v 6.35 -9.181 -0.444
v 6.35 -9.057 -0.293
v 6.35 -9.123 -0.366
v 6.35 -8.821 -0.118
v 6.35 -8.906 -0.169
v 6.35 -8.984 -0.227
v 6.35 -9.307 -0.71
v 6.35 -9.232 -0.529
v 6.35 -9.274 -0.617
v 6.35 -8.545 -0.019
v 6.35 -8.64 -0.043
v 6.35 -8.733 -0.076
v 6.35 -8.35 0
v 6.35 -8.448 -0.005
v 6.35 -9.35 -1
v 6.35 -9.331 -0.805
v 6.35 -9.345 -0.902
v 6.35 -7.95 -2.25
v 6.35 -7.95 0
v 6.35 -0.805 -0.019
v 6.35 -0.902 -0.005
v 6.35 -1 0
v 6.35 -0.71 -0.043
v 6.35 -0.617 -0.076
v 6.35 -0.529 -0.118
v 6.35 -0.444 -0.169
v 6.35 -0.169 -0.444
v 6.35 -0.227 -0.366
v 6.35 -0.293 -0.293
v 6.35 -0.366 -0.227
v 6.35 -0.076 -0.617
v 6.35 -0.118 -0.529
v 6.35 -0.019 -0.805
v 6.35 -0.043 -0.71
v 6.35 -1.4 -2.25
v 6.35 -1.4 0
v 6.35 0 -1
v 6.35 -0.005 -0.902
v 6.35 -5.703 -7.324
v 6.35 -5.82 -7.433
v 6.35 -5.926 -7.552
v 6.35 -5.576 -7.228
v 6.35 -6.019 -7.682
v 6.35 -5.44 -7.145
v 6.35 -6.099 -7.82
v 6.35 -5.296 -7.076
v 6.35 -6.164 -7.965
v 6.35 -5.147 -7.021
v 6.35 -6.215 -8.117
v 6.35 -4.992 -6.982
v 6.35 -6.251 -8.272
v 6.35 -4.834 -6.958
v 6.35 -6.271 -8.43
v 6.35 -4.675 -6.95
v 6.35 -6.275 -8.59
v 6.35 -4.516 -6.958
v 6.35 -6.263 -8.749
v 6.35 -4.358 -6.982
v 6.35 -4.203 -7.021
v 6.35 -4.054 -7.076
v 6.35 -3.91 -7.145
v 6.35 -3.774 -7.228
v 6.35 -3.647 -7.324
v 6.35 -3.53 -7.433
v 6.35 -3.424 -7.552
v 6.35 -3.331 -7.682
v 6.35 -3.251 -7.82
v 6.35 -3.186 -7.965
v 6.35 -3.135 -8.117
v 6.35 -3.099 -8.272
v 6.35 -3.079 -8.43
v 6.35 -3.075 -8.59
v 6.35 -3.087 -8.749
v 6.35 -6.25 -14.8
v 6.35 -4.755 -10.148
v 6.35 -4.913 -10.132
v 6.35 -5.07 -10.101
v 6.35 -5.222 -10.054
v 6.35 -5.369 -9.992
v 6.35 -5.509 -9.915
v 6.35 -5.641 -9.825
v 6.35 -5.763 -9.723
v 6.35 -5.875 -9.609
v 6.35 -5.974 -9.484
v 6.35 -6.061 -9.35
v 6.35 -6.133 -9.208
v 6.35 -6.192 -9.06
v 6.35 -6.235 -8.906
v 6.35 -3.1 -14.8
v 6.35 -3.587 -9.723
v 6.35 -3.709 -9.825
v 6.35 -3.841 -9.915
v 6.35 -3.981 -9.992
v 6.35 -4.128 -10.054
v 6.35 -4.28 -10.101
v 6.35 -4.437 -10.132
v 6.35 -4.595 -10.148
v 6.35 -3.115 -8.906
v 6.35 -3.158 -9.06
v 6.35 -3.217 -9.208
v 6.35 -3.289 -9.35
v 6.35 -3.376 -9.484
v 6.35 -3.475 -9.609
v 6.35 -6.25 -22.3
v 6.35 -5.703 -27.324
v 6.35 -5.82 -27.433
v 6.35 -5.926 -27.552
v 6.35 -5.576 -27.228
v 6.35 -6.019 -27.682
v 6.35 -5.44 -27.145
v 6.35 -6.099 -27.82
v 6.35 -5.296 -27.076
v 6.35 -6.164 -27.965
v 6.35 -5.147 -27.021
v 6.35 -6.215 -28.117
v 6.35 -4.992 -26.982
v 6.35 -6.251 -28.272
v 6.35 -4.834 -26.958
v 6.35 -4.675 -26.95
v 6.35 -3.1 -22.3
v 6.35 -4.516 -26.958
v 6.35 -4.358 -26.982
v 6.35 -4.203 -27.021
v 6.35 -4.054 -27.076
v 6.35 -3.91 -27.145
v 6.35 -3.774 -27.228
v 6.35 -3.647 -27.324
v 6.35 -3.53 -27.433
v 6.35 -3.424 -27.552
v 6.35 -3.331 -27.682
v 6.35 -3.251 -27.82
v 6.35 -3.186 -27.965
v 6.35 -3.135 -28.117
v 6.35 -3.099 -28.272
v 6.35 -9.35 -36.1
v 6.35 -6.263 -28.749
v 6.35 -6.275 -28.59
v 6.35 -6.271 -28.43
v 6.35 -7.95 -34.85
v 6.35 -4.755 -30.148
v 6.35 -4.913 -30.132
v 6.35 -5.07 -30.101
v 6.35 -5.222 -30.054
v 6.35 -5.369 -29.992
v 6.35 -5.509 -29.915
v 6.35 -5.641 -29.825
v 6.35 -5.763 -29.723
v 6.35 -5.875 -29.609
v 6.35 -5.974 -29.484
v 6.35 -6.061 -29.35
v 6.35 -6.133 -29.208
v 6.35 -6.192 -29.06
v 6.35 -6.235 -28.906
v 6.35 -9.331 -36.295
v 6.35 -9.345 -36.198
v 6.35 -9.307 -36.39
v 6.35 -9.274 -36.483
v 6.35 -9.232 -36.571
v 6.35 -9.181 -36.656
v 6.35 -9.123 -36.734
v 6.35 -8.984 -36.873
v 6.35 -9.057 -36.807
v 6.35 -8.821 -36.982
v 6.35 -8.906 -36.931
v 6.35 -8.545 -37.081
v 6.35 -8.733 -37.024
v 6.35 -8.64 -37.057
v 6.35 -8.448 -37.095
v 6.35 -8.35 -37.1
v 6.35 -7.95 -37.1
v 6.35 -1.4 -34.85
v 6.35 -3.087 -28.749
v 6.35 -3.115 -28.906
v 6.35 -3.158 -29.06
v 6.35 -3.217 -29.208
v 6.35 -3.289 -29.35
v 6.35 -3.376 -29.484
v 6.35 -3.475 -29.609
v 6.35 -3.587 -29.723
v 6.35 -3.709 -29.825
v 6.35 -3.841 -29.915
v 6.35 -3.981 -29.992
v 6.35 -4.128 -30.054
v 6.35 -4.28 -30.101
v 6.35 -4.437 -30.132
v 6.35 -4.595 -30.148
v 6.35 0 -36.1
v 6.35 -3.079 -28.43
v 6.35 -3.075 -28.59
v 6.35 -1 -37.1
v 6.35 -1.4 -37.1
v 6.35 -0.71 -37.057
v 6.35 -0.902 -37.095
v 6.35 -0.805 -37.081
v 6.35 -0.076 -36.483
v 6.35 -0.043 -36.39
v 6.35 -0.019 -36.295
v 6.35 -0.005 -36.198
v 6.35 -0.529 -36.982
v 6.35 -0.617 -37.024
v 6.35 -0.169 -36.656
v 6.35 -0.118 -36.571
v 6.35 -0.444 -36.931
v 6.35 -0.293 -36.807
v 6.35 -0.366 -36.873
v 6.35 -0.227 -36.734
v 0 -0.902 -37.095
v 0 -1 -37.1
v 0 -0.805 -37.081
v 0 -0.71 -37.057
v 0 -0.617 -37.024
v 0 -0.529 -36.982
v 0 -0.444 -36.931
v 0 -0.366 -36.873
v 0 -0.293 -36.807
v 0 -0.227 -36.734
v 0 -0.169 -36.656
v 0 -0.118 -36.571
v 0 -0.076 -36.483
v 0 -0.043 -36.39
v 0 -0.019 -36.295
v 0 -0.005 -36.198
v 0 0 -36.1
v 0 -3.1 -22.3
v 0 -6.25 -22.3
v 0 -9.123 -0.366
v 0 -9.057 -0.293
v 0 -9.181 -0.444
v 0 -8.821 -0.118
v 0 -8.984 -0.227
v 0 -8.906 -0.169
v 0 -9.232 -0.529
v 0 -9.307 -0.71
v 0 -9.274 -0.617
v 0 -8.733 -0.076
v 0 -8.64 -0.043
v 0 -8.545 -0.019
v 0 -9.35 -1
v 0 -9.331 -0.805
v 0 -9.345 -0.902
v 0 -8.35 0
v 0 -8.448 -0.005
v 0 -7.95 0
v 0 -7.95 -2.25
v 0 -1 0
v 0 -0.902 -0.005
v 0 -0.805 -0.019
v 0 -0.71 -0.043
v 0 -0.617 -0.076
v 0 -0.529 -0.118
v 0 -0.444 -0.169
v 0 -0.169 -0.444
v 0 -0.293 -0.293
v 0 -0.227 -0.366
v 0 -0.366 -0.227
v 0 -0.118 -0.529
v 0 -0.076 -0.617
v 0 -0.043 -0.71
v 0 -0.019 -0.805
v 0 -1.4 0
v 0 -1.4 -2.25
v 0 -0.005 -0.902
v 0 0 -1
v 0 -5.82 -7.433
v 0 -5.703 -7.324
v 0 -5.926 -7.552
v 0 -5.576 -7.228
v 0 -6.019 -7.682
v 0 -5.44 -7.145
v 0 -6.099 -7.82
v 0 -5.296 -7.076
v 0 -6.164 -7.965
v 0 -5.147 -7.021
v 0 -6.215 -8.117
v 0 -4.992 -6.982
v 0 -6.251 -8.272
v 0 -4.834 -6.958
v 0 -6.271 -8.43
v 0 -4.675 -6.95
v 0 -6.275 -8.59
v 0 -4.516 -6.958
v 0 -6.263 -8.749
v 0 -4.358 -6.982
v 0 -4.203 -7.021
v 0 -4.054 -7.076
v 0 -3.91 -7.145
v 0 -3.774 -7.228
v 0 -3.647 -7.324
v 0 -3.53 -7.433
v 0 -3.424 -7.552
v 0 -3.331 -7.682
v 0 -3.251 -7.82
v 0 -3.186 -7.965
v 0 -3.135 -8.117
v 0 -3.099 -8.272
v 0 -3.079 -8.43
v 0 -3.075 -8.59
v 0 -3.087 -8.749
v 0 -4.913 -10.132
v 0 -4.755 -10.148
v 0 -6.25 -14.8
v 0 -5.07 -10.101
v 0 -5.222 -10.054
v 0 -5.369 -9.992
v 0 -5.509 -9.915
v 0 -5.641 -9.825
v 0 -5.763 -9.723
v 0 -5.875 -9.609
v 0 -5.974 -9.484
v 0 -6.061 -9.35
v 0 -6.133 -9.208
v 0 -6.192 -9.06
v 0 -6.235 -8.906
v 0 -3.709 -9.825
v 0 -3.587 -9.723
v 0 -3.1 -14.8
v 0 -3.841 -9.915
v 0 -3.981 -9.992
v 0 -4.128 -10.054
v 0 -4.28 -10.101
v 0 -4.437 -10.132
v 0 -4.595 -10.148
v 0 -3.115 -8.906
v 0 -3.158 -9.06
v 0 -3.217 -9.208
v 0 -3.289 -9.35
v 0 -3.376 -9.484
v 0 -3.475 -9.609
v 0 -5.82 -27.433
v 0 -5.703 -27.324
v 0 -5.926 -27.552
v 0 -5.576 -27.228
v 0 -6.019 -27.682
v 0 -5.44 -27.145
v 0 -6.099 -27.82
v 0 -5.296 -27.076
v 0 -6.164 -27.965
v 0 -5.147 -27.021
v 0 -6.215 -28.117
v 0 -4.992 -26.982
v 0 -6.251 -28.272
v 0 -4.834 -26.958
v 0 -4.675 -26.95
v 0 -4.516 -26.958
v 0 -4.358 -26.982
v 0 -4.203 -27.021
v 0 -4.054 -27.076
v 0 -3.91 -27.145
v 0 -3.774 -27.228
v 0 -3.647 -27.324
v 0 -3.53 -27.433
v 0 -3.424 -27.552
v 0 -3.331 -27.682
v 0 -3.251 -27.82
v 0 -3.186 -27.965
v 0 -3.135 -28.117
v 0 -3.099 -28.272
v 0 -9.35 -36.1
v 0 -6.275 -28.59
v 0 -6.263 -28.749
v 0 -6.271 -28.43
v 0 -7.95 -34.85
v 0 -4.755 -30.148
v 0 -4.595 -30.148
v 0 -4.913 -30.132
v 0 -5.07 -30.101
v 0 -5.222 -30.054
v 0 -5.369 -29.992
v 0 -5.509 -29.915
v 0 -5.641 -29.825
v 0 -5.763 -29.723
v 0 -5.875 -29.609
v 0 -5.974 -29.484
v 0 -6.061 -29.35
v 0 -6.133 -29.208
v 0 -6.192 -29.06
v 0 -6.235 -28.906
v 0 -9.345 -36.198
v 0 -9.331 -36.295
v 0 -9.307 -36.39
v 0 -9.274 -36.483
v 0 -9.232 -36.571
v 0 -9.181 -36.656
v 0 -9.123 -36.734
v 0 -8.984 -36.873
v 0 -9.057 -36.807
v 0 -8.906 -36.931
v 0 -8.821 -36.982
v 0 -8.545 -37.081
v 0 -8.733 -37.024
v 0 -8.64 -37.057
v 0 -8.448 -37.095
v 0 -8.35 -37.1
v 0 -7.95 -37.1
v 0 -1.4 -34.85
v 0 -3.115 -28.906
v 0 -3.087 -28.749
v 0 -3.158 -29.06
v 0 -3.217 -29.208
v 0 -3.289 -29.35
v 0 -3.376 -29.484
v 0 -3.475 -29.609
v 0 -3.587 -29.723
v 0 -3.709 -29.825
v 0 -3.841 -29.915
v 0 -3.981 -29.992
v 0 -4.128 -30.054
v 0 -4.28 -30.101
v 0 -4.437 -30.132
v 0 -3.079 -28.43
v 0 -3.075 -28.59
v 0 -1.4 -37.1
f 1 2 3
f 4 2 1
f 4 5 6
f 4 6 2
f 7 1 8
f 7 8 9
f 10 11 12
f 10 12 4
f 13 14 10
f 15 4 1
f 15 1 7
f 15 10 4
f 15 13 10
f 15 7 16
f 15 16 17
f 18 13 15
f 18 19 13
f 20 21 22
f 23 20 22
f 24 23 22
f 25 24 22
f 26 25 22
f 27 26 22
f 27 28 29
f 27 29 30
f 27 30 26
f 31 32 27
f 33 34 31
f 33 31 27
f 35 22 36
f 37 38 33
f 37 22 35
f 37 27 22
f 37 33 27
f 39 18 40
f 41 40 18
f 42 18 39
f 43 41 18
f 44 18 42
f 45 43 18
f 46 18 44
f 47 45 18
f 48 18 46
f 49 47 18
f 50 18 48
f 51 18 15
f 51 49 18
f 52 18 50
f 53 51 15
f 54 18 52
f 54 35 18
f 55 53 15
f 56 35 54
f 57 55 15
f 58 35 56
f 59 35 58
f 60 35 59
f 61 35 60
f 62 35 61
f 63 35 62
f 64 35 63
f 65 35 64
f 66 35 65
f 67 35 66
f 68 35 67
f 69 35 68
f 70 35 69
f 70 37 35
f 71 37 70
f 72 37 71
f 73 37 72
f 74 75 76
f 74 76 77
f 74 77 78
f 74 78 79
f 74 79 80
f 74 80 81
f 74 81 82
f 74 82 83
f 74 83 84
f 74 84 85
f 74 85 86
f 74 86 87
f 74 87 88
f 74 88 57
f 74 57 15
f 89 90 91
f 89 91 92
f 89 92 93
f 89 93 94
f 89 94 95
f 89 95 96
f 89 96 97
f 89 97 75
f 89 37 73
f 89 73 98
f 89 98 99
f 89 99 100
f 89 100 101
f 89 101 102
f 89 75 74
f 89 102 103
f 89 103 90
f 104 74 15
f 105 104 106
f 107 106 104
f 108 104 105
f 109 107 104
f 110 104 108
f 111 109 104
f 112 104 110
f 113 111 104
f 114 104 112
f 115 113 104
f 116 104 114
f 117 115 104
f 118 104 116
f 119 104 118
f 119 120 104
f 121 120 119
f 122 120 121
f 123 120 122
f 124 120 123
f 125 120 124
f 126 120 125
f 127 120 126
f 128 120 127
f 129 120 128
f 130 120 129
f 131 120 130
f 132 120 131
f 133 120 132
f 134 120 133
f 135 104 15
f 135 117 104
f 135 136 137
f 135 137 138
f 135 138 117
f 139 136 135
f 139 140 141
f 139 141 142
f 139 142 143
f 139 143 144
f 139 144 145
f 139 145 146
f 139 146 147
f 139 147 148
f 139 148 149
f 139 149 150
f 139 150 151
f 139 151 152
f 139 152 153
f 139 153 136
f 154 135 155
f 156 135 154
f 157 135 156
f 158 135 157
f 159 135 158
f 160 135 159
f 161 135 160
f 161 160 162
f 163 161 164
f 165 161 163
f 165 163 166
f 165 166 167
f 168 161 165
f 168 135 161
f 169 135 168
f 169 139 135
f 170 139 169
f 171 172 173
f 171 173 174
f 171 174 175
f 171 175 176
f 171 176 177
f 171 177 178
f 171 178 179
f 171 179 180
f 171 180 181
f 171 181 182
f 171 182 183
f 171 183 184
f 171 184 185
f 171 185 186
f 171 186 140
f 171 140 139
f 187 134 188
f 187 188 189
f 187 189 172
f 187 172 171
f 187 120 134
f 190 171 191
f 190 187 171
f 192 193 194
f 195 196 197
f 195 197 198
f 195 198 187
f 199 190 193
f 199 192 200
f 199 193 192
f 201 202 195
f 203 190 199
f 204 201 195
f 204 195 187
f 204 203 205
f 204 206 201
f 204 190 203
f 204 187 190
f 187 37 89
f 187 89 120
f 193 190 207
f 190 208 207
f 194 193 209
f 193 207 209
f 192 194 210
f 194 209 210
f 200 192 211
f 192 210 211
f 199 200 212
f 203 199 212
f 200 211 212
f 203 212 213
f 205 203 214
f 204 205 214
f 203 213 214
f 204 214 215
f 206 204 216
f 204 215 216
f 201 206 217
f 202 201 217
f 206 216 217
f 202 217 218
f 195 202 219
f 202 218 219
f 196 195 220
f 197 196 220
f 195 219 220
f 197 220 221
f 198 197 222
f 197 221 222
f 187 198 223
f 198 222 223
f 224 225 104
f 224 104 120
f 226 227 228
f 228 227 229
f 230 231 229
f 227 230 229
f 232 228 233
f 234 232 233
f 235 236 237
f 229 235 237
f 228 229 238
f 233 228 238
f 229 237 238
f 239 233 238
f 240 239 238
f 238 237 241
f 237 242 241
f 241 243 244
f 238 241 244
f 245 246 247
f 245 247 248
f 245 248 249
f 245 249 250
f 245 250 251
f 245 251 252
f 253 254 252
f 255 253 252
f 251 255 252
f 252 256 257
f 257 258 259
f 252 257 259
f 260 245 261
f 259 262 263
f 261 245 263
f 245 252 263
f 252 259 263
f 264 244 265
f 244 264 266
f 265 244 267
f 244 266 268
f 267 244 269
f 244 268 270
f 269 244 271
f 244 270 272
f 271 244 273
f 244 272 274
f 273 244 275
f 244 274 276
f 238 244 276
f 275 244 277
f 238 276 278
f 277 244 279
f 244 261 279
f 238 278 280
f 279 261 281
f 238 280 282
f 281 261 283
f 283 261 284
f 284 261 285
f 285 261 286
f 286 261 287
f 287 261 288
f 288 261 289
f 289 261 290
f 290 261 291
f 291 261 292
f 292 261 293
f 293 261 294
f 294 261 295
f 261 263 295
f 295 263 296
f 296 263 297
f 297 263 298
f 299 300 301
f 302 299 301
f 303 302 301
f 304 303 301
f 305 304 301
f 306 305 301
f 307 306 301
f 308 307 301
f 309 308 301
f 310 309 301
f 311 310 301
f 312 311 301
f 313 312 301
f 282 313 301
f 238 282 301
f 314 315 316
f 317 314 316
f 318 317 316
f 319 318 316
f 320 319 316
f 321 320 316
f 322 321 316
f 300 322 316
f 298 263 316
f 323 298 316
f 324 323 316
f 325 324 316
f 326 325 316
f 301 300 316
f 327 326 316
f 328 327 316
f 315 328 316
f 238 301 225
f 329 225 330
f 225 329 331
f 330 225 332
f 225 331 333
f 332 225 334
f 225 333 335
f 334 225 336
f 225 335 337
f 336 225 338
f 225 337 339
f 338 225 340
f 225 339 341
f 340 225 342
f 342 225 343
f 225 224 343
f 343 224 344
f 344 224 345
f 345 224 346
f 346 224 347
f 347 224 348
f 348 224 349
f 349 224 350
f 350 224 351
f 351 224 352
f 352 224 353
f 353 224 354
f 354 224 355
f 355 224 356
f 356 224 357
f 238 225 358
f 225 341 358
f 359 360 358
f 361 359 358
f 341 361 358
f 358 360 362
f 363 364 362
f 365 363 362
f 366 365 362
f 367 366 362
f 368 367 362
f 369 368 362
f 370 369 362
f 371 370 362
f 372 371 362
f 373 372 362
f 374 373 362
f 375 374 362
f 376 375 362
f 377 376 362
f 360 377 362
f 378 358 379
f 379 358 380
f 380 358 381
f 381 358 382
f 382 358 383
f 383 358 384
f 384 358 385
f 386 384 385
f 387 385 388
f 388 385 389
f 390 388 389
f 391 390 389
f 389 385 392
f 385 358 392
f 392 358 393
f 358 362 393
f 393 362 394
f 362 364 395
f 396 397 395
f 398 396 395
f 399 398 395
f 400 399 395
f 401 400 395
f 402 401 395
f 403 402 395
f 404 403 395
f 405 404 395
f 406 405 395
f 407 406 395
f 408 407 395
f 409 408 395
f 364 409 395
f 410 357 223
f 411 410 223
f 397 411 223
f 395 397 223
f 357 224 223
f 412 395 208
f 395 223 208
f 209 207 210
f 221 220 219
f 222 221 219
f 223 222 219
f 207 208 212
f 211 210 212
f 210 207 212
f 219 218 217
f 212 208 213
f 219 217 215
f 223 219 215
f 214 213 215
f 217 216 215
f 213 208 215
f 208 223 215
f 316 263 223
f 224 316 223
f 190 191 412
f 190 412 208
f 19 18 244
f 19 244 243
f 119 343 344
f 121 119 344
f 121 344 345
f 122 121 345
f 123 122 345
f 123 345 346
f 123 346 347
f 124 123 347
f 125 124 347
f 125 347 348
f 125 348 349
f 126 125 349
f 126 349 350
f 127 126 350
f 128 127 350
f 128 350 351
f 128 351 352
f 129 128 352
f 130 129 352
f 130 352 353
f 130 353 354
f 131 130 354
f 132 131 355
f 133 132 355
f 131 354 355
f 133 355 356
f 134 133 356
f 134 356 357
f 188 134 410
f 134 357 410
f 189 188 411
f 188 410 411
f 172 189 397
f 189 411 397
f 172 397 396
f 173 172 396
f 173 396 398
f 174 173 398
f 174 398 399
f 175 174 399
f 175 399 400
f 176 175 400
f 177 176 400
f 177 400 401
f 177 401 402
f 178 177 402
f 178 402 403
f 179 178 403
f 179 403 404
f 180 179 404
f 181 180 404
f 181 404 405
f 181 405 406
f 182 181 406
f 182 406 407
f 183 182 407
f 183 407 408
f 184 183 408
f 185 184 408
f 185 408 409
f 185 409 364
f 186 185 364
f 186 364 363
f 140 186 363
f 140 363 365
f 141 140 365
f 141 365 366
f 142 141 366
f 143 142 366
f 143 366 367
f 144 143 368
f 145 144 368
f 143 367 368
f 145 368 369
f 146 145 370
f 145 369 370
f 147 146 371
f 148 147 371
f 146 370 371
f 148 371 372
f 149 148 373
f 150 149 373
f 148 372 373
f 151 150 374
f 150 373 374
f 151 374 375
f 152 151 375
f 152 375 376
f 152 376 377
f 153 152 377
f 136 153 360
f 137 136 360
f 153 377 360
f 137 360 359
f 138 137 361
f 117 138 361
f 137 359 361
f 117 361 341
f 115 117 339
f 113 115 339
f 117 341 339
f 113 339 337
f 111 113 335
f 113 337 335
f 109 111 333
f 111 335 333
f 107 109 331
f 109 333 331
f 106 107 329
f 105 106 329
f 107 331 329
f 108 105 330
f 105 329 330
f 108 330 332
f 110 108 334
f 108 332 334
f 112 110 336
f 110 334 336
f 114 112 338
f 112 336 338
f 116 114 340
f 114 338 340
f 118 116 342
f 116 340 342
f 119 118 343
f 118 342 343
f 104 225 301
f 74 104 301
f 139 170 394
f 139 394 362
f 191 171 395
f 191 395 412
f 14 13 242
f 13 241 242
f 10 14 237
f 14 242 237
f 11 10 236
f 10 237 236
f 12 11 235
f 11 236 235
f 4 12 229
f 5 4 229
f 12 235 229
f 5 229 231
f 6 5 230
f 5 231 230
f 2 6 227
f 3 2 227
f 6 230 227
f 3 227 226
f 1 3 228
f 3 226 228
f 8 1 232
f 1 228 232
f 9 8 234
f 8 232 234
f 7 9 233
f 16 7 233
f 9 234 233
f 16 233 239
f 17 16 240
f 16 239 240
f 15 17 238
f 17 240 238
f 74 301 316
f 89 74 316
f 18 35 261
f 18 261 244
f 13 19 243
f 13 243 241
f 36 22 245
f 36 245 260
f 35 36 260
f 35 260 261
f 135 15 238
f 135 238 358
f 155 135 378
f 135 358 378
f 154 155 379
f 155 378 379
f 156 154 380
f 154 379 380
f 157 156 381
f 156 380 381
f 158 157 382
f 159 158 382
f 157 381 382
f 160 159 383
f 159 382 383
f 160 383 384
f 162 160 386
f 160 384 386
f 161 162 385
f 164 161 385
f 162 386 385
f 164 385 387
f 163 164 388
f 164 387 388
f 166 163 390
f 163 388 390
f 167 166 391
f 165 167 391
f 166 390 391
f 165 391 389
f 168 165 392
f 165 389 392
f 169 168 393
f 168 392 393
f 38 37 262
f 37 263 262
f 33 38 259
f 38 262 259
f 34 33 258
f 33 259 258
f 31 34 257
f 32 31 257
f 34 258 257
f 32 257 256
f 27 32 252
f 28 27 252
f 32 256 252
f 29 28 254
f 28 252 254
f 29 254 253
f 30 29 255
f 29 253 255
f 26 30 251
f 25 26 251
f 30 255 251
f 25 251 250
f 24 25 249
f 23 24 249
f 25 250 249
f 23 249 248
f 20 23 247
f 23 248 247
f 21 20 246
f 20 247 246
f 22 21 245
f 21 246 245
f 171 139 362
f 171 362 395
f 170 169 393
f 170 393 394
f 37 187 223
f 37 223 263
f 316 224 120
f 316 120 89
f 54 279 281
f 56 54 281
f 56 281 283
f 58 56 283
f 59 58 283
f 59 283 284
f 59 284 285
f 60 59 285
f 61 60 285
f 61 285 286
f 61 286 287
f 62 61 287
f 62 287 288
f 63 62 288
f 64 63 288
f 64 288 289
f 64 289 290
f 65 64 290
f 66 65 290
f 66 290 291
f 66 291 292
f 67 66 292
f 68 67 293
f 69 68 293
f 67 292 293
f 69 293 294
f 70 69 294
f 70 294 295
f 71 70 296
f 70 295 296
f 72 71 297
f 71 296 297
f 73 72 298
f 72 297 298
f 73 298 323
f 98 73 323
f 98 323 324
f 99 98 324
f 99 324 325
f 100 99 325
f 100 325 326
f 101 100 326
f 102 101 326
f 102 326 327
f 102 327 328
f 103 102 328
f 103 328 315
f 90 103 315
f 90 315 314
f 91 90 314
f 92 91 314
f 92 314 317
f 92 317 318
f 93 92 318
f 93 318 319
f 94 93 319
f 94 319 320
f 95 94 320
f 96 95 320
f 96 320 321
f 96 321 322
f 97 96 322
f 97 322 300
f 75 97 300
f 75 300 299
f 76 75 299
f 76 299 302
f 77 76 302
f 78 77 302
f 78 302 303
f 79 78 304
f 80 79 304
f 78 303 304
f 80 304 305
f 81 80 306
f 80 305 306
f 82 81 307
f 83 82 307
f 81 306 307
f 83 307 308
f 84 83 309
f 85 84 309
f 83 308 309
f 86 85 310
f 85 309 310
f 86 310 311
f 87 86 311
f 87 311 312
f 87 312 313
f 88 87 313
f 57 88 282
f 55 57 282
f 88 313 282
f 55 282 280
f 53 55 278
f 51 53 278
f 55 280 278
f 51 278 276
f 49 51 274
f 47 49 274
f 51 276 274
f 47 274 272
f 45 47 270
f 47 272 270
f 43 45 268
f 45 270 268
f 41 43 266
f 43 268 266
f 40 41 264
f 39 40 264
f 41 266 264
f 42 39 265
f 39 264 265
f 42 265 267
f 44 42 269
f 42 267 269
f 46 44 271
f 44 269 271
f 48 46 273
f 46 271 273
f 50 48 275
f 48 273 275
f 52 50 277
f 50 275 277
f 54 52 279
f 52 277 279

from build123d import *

# Parameters (mm, degrees)
BOSS_EXTRUDE1_DEPTH            = 6.35
FILLET1_R                      = 1
SKETCH2_W                      = 7.5
SKETCH2_H                      = 3.15
CUT_EXTRUDE1_DEPTH             = 7.35
F_3_2_3_2_DIAMETER_HOLE1_D     = 3.2
F_3_2_3_2_DIAMETER_HOLE1_DEPTH = 6.35
F_3_2_3_2_DIAMETER_HOLE2_D     = 3.2
F_3_2_3_2_DIAMETER_HOLE2_DEPTH = 6.35


with BuildPart() as part:
    # Sketch1 → Boss-Extrude1 (new body)
    with BuildSketch(Plane(origin=(6.35, 0, 0), x_dir=(0, 0, -1), z_dir=(1, 0, 0))):
        Polygon((37.1, -7.95), (34.85, -7.95), (34.85, -1.4), (37.1, -1.4), (37.1, 0), (0, 0), (0, -1.4), (2.25, -1.4), (2.25, -7.95), (0, -7.95), (0, -9.35), (37.1, -9.35), align=None)
    extrude(amount=-BOSS_EXTRUDE1_DEPTH)

    # Fillet1
    fillet1_edges = [part.edges().sort_by_distance(p)[0] for p in [
        (3.175, -9.35, -37.1),
        (3.175, -9.35, 0),
        (3.175, 0, 0),
        (3.175, 0, -37.1),
    ]]
    fillet(fillet1_edges, radius=FILLET1_R)

    # Sketch2 → Cut-Extrude1 (cut, through all)
    with BuildSketch(Plane.ZY):
        with Locations((-18.55, -4.675)):
            Rectangle(SKETCH2_W, SKETCH2_H)
    extrude(amount=-CUT_EXTRUDE1_DEPTH, mode=Mode.SUBTRACT)

    # Ø3.2 (3.2) Diameter Hole1
    with Locations(Plane(origin=(6.35, 0, 0), x_dir=(0, 0, -1), z_dir=(1, 0, 0))):
        with Locations((28.55, -4.675)):
            Hole(F_3_2_3_2_DIAMETER_HOLE1_D / 2, depth=F_3_2_3_2_DIAMETER_HOLE1_DEPTH)

    # Ø3.2 (3.2) Diameter Hole2
    with Locations(Plane(origin=(6.35, 0, 0), x_dir=(0, 0, -1), z_dir=(1, 0, 0))):
        with Locations((8.55, -4.675)):
            Hole(F_3_2_3_2_DIAMETER_HOLE2_D / 2, depth=F_3_2_3_2_DIAMETER_HOLE2_DEPTH)


solid = part.part
